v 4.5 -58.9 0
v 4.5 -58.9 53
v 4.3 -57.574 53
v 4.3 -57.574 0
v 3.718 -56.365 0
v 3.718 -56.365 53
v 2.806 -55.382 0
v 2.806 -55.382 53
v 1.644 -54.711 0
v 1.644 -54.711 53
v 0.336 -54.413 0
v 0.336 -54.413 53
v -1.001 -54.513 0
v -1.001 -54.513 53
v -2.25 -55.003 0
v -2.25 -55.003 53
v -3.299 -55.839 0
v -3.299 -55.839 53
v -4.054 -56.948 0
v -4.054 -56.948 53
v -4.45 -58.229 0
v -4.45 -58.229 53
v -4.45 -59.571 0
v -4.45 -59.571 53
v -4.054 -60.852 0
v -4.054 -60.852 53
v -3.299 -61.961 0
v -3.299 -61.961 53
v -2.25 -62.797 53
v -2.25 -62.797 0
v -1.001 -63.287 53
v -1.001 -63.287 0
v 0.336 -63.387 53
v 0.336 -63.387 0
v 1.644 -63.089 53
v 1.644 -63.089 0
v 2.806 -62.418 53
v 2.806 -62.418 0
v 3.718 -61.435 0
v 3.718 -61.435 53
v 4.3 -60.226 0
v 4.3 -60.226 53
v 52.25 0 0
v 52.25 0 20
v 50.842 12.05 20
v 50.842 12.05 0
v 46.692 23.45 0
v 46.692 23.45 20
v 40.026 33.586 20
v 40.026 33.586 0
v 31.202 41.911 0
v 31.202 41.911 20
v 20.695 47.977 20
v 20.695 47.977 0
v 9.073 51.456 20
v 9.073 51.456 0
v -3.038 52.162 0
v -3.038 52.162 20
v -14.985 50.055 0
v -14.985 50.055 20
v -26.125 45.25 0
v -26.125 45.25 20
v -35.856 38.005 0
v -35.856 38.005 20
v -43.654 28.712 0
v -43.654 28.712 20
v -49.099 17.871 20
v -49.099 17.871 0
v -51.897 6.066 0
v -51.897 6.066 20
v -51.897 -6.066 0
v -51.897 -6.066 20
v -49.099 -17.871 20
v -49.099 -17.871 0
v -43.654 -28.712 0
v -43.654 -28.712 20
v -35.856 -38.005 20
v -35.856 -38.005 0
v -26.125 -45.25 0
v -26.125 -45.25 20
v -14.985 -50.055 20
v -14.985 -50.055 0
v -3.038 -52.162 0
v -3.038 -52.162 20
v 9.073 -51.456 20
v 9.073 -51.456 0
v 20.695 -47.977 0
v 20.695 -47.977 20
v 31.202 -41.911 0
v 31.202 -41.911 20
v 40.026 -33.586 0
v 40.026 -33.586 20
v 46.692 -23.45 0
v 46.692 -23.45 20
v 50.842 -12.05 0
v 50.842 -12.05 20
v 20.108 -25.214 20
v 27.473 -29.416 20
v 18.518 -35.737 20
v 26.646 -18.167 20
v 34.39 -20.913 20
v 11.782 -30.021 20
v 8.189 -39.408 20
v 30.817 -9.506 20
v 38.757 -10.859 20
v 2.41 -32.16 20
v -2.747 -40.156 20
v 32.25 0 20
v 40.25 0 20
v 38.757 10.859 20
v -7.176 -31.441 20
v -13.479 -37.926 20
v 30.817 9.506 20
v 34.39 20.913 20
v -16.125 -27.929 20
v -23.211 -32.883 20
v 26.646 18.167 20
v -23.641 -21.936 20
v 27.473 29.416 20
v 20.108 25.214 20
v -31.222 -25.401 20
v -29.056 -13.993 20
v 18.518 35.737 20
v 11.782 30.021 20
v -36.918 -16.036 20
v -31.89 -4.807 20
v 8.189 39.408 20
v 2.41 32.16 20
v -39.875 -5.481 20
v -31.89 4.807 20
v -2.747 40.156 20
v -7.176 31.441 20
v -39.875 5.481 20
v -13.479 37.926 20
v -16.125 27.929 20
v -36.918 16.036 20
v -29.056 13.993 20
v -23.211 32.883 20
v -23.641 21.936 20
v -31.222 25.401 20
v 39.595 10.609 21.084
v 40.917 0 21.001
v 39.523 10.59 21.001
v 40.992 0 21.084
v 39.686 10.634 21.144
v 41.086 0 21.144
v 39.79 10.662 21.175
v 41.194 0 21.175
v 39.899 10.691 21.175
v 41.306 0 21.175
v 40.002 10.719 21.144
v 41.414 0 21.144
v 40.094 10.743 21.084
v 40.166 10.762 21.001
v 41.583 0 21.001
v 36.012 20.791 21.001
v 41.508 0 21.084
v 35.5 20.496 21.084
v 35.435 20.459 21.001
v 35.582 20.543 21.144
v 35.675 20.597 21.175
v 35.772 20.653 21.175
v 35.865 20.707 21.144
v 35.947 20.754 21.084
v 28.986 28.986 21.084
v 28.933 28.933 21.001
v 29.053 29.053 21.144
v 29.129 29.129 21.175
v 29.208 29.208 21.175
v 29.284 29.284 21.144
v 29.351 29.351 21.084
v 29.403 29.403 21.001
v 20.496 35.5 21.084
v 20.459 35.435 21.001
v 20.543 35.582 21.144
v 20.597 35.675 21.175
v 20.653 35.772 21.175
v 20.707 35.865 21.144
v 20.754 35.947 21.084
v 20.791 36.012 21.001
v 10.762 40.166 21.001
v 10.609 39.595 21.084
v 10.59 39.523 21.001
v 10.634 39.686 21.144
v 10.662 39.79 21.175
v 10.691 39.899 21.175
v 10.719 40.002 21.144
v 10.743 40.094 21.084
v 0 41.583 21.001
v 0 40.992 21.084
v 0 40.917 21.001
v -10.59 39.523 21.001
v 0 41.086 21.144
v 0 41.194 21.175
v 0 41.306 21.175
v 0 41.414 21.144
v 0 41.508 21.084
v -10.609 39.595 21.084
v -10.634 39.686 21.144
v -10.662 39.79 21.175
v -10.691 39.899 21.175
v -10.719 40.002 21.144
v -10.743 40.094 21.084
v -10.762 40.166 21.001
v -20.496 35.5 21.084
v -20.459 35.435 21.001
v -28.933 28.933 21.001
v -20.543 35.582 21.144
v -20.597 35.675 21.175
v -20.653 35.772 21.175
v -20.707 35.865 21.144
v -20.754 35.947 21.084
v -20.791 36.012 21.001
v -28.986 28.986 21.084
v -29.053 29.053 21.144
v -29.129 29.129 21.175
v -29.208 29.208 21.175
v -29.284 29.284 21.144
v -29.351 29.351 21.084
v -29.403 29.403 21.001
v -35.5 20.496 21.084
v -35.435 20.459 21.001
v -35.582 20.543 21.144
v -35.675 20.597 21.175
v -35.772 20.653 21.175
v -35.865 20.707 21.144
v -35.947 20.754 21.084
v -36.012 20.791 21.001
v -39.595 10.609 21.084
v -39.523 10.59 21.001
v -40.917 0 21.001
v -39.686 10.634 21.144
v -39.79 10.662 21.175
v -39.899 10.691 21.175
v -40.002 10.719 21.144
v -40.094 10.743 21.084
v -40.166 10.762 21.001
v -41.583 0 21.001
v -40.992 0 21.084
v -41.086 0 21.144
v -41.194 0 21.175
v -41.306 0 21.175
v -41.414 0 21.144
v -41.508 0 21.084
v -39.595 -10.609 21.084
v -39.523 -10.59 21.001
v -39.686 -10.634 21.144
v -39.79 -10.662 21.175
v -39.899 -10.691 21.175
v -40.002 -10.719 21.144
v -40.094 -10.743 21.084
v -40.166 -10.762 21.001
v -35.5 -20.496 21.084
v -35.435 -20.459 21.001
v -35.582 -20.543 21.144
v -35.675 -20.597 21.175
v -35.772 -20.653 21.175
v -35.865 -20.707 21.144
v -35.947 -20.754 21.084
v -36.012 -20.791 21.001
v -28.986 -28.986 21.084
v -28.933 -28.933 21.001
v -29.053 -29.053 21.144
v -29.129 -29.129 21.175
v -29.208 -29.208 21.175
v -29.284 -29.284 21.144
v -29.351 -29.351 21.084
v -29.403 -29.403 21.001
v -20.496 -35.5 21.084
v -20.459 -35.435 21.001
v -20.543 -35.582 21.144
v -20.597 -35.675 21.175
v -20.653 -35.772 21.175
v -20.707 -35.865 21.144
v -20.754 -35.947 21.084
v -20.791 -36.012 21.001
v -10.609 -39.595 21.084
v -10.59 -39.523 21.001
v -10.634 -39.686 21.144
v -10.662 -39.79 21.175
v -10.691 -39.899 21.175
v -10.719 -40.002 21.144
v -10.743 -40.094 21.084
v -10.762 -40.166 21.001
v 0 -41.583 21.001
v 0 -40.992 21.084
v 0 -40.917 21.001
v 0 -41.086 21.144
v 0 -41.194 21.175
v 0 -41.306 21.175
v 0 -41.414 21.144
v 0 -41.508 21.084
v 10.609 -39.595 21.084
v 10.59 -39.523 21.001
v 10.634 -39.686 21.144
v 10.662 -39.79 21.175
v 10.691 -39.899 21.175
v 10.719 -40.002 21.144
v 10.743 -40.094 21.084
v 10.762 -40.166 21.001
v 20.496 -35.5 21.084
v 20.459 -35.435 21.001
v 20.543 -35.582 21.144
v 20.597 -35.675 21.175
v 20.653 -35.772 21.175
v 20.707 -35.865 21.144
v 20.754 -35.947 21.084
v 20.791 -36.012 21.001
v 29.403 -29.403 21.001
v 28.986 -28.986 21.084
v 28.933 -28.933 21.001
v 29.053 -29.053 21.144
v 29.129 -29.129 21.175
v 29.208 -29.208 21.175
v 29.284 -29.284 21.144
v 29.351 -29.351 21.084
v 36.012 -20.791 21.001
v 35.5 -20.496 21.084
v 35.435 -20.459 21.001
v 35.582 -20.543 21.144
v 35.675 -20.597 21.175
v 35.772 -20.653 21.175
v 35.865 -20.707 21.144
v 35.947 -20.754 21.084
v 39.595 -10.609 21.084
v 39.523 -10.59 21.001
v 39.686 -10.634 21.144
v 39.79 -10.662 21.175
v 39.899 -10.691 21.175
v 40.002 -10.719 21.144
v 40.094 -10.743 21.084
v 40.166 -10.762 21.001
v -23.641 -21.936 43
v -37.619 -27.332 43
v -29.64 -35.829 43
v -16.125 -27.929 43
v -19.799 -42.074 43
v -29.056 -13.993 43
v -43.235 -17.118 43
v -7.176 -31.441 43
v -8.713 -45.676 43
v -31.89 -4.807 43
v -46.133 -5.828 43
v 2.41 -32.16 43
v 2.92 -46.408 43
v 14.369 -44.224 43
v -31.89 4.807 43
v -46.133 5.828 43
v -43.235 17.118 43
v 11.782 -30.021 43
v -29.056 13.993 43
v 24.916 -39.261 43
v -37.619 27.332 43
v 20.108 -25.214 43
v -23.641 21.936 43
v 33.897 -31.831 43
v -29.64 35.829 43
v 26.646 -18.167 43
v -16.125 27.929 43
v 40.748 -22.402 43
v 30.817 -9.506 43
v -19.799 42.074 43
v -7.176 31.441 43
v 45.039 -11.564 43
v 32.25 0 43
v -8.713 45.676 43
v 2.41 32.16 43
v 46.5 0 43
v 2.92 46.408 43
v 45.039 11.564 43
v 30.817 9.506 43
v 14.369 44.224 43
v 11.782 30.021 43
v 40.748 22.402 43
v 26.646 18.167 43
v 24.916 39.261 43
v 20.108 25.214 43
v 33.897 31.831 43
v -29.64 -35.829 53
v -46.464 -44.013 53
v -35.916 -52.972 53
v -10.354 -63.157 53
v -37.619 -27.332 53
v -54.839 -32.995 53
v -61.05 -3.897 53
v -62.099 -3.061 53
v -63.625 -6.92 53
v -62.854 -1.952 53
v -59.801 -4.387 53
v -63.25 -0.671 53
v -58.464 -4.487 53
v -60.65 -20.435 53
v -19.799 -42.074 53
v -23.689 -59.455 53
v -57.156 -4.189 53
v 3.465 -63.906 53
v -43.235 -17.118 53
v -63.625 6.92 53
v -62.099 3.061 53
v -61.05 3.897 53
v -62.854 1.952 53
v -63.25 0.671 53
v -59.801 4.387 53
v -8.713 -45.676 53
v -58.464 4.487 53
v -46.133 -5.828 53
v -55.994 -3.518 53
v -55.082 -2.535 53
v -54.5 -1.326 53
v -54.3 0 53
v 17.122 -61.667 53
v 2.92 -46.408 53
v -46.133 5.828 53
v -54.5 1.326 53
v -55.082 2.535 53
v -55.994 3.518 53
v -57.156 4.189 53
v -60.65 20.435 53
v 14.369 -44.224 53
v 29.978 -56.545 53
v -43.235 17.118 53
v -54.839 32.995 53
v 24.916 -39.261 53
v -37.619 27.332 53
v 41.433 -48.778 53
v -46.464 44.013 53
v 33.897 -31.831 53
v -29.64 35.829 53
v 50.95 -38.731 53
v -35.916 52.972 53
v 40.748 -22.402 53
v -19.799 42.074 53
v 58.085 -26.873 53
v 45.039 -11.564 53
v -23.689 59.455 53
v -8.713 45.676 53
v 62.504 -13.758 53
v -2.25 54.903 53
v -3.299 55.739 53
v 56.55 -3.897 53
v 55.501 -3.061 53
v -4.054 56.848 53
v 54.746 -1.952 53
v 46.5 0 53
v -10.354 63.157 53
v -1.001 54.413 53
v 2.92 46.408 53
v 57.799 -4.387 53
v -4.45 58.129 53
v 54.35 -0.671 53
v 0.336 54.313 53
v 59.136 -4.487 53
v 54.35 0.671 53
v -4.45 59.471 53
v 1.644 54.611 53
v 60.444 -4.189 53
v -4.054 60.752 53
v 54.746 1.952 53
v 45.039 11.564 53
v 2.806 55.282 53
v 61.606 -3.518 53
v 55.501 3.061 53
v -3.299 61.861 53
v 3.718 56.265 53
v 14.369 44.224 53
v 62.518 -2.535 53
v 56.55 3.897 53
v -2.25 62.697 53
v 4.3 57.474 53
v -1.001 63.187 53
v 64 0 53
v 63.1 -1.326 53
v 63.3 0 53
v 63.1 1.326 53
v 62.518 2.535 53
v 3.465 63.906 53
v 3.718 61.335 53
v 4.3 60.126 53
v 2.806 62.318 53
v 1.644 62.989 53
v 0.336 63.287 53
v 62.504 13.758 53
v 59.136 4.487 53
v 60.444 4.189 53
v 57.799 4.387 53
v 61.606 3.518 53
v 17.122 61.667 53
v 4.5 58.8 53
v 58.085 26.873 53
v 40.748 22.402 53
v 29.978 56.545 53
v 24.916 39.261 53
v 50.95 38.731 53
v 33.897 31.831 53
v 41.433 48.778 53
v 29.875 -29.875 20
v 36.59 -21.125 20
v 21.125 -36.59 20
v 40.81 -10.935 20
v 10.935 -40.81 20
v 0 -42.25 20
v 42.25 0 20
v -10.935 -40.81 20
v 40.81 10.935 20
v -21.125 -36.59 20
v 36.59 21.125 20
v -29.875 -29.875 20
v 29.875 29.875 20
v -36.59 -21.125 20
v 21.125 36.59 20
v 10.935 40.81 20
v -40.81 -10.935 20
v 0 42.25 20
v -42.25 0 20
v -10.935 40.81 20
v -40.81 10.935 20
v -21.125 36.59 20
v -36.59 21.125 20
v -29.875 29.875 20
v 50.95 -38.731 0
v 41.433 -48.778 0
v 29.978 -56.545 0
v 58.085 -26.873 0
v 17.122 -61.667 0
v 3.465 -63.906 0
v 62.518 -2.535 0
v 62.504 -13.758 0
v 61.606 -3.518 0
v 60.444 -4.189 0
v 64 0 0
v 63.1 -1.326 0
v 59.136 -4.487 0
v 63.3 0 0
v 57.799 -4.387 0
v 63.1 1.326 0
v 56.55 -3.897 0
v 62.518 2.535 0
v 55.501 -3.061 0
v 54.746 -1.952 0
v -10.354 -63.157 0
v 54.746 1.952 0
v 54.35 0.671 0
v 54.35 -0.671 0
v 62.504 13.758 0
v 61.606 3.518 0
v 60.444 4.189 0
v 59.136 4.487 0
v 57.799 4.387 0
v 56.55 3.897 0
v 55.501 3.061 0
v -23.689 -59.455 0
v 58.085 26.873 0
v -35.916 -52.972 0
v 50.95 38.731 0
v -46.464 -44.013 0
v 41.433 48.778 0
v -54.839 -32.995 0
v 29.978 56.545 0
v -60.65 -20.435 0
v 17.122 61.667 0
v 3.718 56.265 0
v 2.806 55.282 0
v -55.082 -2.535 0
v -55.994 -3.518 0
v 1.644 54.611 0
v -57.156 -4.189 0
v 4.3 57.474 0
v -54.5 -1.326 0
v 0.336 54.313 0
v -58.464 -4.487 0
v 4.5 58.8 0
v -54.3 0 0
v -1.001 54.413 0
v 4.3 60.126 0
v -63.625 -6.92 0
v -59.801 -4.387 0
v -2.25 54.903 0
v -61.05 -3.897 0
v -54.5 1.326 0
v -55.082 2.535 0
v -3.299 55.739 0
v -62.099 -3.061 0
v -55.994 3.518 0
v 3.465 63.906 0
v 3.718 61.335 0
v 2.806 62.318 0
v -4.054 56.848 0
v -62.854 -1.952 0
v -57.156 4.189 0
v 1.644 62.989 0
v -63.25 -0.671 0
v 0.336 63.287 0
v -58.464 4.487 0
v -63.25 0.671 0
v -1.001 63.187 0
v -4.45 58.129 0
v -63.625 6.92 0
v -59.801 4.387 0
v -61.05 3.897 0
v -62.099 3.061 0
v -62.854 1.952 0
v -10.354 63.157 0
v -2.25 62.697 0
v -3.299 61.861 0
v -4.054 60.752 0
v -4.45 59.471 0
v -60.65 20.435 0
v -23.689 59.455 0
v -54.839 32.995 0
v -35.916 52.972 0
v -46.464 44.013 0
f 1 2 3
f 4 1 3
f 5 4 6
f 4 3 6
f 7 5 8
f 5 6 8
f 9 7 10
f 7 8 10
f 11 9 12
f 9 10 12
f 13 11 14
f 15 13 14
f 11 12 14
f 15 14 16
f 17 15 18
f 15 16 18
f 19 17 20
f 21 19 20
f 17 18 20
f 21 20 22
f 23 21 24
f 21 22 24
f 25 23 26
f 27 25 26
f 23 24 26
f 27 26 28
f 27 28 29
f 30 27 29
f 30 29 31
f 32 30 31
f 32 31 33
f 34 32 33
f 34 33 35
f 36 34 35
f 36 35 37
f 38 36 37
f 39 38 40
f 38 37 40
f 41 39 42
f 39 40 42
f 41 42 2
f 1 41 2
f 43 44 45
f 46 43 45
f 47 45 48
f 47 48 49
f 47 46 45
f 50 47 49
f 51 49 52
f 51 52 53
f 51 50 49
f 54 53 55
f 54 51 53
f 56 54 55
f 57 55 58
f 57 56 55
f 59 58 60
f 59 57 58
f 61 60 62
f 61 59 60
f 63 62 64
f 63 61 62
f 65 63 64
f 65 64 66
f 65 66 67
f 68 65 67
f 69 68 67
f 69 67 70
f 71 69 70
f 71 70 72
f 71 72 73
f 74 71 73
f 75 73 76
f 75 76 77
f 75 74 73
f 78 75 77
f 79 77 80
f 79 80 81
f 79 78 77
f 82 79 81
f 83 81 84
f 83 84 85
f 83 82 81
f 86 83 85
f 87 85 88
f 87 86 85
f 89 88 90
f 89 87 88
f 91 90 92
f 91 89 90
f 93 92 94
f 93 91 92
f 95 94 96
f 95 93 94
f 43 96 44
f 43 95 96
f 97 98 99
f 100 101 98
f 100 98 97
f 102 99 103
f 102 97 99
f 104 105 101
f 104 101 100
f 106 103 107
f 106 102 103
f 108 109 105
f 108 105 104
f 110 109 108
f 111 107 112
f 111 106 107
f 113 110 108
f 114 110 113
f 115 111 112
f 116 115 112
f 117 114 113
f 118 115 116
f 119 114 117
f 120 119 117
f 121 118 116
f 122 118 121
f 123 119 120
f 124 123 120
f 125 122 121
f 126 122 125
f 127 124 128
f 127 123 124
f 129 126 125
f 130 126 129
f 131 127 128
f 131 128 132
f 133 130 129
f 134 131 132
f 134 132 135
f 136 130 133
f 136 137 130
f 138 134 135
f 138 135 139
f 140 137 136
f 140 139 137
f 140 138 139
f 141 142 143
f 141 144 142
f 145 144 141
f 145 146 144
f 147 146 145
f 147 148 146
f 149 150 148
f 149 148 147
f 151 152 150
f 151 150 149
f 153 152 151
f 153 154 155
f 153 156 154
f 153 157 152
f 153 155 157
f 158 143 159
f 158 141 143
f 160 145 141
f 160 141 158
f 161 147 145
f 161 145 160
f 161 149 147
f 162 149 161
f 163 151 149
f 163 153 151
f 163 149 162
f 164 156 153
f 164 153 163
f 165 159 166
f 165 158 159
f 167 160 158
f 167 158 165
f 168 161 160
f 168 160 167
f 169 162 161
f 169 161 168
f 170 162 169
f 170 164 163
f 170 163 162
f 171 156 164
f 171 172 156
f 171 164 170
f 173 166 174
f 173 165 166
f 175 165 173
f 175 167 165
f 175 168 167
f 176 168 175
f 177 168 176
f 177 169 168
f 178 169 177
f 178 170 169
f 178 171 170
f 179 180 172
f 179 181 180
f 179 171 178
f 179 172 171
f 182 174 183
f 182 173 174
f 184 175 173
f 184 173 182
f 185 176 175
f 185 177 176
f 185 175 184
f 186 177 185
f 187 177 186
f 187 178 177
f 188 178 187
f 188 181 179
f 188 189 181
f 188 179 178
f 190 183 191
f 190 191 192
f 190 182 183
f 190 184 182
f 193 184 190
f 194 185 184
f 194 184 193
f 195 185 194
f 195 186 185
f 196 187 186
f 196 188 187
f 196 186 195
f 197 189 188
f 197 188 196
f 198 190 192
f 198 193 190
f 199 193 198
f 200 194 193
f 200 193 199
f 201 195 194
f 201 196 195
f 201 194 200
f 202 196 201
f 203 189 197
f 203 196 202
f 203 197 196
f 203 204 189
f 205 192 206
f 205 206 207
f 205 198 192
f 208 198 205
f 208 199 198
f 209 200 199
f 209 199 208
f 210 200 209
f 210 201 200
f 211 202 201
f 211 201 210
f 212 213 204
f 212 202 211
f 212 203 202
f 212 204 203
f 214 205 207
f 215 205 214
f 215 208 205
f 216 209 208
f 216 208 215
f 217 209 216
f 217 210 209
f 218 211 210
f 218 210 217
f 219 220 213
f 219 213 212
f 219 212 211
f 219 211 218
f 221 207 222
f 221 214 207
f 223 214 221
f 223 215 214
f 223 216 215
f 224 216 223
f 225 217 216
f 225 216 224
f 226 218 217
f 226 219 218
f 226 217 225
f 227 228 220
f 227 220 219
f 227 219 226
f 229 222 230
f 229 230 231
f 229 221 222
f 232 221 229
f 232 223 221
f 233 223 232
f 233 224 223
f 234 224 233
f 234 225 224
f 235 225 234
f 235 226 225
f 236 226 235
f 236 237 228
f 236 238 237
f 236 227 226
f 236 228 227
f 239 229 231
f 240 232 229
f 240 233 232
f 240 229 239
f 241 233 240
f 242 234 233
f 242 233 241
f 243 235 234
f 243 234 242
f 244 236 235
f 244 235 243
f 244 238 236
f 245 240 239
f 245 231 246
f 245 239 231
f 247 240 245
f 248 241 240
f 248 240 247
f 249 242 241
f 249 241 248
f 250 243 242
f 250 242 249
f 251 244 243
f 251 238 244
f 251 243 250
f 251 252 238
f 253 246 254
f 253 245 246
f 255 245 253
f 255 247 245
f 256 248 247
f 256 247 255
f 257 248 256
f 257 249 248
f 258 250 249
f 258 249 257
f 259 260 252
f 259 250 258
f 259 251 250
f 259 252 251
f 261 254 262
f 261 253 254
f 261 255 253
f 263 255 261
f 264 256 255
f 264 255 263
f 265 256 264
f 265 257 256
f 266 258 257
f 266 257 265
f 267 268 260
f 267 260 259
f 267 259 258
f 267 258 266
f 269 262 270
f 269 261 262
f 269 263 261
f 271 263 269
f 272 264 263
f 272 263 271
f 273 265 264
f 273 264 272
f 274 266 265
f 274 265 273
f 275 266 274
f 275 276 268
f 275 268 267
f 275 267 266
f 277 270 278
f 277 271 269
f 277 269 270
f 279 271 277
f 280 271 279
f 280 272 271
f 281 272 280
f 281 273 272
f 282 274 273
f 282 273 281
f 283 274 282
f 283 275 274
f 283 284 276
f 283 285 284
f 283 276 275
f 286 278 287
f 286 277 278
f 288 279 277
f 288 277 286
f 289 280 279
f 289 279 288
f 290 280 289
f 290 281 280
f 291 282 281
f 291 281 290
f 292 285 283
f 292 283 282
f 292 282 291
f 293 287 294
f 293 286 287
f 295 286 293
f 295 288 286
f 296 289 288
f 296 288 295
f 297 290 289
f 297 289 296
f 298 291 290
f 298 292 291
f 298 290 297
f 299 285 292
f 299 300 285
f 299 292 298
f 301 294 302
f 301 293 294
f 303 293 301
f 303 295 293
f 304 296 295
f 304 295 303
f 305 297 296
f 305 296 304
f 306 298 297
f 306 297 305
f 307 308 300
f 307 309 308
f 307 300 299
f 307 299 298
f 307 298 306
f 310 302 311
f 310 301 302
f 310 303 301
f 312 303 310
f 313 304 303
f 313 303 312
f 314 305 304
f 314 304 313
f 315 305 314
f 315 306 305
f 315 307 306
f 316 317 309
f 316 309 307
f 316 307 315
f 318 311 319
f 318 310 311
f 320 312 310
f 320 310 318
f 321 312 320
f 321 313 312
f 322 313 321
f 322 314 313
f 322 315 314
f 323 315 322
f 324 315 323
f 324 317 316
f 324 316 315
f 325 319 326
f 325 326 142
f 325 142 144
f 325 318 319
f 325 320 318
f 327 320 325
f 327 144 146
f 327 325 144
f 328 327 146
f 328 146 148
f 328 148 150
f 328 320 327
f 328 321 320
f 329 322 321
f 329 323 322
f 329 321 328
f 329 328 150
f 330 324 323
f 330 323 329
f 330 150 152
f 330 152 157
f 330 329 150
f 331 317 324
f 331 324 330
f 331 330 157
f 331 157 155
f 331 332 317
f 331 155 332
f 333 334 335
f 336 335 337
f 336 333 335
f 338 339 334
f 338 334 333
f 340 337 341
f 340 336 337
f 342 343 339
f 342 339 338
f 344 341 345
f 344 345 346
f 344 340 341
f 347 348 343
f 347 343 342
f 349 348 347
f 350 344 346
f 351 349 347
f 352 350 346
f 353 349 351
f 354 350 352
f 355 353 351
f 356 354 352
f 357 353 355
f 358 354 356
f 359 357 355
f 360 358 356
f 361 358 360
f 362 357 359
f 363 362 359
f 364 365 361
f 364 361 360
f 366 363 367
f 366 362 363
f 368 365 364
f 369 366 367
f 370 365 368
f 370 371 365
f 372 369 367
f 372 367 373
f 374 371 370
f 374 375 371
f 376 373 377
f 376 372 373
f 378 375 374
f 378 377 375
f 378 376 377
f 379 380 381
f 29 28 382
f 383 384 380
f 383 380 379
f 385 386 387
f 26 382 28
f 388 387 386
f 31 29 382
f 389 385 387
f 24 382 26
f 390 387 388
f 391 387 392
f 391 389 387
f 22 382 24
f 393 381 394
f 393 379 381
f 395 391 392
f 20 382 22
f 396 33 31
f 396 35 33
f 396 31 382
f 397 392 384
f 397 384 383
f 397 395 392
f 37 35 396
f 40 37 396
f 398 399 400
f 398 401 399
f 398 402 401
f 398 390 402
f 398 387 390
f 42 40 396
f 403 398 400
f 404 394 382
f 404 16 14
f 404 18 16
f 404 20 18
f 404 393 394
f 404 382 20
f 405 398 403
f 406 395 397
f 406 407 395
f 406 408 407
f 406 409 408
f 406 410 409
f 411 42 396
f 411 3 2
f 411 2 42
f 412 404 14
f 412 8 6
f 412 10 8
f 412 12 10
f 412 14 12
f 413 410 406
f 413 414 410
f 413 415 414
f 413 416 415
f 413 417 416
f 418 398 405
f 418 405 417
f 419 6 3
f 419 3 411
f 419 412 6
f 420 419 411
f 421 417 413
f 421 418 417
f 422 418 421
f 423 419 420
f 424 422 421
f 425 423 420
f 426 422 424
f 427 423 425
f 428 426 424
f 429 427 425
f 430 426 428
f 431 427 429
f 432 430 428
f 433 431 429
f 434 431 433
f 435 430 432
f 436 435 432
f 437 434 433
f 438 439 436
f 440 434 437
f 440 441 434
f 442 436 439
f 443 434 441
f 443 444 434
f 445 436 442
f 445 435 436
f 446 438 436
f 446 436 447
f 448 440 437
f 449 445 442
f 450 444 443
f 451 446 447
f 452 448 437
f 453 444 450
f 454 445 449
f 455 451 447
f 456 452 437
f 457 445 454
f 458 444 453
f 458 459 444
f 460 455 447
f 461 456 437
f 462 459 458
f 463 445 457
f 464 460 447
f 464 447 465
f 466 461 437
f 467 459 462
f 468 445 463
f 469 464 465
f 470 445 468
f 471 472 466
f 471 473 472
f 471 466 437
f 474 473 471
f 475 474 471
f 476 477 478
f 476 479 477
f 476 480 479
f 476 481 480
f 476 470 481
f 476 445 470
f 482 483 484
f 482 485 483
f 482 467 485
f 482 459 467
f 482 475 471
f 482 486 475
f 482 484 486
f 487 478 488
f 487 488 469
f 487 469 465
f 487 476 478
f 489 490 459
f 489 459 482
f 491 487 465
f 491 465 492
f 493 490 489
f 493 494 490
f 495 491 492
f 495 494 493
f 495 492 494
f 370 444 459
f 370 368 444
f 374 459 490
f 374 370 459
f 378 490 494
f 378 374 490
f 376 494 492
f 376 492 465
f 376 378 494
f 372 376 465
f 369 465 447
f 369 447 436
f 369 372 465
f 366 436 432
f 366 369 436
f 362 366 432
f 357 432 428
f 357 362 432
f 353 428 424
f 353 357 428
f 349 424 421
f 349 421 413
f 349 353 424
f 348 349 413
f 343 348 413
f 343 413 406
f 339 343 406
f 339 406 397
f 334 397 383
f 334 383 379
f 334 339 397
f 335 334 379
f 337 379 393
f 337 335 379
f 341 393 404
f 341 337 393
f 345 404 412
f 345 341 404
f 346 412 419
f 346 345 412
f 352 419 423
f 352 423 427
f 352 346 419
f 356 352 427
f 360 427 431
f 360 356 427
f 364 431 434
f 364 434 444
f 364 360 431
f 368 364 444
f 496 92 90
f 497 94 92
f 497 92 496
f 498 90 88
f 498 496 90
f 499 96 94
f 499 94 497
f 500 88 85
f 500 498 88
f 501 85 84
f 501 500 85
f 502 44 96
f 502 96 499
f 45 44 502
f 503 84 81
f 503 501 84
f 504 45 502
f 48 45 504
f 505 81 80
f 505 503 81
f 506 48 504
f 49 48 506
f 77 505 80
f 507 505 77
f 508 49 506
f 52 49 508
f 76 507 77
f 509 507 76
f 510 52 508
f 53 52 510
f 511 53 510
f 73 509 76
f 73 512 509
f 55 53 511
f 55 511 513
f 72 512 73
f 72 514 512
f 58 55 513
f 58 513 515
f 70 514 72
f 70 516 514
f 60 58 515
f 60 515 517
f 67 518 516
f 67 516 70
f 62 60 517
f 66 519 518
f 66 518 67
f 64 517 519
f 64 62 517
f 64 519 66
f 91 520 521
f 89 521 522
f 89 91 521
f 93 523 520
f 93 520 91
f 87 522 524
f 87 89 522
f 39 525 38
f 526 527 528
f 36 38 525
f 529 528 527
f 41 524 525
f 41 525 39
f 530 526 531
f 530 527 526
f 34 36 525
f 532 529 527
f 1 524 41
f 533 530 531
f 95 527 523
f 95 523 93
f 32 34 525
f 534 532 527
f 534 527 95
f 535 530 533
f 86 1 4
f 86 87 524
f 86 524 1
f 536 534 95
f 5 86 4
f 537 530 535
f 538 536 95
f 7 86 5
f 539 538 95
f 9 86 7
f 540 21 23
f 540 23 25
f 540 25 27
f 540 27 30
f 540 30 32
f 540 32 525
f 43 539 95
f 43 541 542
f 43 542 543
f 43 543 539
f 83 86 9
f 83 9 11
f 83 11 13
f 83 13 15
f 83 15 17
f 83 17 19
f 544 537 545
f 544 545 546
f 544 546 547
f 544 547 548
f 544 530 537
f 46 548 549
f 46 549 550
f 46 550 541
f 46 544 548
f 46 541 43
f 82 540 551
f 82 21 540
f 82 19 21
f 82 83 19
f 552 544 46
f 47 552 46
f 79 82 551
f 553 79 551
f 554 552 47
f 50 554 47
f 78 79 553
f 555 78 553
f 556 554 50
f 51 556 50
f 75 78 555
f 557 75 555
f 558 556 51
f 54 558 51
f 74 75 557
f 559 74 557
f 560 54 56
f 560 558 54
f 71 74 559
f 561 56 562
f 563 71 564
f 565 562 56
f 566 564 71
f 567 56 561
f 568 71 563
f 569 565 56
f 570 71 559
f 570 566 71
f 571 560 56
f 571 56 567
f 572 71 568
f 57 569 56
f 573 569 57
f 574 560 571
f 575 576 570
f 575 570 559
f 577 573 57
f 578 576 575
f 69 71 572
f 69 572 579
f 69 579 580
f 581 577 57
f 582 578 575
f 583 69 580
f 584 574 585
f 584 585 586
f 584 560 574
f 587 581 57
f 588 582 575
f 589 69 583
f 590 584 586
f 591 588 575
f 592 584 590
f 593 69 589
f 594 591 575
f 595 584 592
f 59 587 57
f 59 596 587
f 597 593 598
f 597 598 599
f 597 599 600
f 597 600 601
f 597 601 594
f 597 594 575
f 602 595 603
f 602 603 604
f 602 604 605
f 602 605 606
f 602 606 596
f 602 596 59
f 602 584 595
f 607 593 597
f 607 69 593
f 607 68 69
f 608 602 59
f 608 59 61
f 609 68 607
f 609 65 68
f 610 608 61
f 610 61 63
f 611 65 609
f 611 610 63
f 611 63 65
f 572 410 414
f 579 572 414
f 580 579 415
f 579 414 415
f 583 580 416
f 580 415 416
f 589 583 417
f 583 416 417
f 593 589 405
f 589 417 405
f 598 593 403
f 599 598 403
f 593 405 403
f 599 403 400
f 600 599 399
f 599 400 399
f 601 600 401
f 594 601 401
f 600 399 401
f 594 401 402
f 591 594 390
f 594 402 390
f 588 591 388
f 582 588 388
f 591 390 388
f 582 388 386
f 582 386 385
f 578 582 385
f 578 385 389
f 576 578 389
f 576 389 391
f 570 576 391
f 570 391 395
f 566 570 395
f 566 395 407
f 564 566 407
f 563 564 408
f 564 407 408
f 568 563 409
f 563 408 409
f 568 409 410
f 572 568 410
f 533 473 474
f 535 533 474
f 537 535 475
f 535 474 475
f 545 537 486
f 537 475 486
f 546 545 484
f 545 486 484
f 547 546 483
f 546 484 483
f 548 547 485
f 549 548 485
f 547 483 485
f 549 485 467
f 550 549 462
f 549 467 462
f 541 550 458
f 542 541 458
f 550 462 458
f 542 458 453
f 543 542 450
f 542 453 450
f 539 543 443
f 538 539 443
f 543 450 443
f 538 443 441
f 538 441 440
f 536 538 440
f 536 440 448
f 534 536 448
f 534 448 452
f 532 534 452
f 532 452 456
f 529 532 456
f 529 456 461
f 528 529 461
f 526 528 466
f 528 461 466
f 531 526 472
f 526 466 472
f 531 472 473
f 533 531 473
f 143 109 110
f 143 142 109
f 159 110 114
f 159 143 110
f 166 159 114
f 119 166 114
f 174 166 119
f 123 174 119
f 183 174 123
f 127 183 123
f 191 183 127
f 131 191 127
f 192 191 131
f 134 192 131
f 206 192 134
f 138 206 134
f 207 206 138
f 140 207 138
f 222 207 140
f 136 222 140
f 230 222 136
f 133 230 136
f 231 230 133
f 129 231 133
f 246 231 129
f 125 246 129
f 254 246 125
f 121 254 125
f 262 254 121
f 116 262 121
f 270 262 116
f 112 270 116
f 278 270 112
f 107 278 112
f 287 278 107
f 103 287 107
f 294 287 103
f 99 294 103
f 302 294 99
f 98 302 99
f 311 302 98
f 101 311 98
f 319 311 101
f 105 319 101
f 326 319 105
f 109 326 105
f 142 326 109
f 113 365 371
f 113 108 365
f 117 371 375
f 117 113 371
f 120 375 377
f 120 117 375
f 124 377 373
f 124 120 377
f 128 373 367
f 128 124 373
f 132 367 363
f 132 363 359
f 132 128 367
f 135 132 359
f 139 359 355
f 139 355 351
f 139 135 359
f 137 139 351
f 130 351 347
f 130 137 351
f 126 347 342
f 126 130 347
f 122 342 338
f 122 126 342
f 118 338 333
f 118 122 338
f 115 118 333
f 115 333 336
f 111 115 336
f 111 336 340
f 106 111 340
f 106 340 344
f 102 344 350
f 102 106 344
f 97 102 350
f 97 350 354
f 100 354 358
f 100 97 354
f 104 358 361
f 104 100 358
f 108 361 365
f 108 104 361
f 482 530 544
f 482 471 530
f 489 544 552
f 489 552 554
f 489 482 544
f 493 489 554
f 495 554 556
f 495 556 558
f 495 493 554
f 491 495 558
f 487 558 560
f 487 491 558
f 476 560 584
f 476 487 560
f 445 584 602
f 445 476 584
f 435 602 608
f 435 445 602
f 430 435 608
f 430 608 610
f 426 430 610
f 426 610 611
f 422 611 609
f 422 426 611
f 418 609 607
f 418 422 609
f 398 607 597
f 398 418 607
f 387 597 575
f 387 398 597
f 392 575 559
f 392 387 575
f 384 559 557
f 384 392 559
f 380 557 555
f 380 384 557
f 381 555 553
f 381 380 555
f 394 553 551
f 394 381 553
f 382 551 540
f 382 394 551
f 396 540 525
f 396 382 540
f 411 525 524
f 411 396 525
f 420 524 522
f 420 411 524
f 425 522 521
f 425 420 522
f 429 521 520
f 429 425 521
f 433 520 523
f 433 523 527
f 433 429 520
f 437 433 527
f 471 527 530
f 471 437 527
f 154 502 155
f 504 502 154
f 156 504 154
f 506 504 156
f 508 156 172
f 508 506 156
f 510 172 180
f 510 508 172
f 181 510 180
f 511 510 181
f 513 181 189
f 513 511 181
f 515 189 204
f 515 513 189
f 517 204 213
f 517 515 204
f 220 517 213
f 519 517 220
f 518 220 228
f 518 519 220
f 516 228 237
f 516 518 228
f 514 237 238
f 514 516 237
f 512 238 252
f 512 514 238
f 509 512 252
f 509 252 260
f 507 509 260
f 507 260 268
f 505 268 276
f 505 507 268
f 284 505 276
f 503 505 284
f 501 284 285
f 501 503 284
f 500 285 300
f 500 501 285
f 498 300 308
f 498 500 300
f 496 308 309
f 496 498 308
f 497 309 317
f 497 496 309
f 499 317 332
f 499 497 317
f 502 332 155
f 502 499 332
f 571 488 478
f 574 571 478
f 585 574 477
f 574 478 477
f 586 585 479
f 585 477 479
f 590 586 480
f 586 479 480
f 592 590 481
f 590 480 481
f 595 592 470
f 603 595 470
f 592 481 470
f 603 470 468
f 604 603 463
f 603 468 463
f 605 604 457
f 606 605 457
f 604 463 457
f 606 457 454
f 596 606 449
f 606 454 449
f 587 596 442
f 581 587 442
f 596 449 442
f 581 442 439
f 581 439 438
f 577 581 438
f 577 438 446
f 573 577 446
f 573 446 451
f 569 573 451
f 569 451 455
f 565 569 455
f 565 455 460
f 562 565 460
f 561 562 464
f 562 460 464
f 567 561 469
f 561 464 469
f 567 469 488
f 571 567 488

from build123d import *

# Parameters (mm, degrees)
F2_R     = 4.5
F3_DEPTH = 53


with BuildPart() as f1:
    # F0 (on Front) → F1 (revolve)
    with BuildSketch(Plane.XZ):
        with BuildLine():
            Line((52.25, 0), (64, 0))
            Line((64, 0), (64, 53))
            Line((64, 53), (46.5, 53))
            Line((46.5, 53), (46.5, 43))
            Line((46.5, 43), (32.25, 43))
            Line((32.25, 43), (32.25, 20))
            Line((32.25, 20), (40.25, 20))
            Line((40.25, 20), (40.91718, 21.00077))
            ThreePointArc((40.91718, 21.00077), (41.25, 21.17889), (41.58282, 21.00077))
            Line((41.58282, 21.00077), (42.25, 20))
            Line((42.25, 20), (52.25, 20))
            Line((52.25, 20), (52.25, 0))
        make_face()
    revolve(axis=Axis((0, 0, 26.5), (0, 0, 1)))

    # F2 (on face) → F3 (cut)
    with BuildSketch(Plane.XY.offset(53)):
        with Locations((0, 58.8)):
            Circle(F2_R)
        with Locations((58.8, 0)):
            Circle(F2_R)
        with Locations((0, -58.899999)):
            Circle(F2_R)
        with Locations((-58.8, 0)):
            Circle(F2_R)
    extrude(amount=-F3_DEPTH, mode=Mode.SUBTRACT)


solid = f1.part
